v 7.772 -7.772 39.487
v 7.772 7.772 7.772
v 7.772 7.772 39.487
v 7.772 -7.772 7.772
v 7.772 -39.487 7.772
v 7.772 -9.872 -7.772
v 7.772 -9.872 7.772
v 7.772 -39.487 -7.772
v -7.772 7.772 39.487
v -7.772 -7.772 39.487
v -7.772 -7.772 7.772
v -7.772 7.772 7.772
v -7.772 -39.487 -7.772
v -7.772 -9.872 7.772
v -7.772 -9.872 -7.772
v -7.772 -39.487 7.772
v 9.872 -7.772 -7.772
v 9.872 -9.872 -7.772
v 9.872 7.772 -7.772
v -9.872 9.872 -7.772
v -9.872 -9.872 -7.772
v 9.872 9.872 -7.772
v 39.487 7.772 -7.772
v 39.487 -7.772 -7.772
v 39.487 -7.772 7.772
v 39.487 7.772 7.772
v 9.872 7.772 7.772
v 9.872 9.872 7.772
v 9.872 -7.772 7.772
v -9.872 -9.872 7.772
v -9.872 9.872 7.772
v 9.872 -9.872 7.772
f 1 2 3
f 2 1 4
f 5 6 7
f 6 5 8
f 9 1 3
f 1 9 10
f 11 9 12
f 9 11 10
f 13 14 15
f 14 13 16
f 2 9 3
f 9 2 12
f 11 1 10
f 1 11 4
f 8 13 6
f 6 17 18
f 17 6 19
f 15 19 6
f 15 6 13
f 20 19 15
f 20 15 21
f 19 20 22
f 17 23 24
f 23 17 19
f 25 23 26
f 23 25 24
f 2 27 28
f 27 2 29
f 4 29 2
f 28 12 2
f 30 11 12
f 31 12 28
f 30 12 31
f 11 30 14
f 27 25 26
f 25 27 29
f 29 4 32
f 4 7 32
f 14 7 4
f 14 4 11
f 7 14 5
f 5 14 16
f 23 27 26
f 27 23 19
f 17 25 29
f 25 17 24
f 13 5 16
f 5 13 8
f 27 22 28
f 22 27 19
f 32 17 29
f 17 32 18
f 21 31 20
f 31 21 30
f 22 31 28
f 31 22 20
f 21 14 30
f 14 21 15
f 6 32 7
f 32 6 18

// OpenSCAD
profil=20/1.013;
stena=3*1.4;

vnitek=profil-stena;

rotate([0,0,0]) translate([0,0,profil])cube([vnitek,vnitek,2*profil],center = true);
rotate([0,90,0]) translate([0,0,profil])cube([vnitek,vnitek,2*profil],center = true);
rotate([90,0,0]) translate([0,0,profil])cube([vnitek,vnitek,2*profil],center = true);
cube([profil,profil,profil-stena], center = true);
